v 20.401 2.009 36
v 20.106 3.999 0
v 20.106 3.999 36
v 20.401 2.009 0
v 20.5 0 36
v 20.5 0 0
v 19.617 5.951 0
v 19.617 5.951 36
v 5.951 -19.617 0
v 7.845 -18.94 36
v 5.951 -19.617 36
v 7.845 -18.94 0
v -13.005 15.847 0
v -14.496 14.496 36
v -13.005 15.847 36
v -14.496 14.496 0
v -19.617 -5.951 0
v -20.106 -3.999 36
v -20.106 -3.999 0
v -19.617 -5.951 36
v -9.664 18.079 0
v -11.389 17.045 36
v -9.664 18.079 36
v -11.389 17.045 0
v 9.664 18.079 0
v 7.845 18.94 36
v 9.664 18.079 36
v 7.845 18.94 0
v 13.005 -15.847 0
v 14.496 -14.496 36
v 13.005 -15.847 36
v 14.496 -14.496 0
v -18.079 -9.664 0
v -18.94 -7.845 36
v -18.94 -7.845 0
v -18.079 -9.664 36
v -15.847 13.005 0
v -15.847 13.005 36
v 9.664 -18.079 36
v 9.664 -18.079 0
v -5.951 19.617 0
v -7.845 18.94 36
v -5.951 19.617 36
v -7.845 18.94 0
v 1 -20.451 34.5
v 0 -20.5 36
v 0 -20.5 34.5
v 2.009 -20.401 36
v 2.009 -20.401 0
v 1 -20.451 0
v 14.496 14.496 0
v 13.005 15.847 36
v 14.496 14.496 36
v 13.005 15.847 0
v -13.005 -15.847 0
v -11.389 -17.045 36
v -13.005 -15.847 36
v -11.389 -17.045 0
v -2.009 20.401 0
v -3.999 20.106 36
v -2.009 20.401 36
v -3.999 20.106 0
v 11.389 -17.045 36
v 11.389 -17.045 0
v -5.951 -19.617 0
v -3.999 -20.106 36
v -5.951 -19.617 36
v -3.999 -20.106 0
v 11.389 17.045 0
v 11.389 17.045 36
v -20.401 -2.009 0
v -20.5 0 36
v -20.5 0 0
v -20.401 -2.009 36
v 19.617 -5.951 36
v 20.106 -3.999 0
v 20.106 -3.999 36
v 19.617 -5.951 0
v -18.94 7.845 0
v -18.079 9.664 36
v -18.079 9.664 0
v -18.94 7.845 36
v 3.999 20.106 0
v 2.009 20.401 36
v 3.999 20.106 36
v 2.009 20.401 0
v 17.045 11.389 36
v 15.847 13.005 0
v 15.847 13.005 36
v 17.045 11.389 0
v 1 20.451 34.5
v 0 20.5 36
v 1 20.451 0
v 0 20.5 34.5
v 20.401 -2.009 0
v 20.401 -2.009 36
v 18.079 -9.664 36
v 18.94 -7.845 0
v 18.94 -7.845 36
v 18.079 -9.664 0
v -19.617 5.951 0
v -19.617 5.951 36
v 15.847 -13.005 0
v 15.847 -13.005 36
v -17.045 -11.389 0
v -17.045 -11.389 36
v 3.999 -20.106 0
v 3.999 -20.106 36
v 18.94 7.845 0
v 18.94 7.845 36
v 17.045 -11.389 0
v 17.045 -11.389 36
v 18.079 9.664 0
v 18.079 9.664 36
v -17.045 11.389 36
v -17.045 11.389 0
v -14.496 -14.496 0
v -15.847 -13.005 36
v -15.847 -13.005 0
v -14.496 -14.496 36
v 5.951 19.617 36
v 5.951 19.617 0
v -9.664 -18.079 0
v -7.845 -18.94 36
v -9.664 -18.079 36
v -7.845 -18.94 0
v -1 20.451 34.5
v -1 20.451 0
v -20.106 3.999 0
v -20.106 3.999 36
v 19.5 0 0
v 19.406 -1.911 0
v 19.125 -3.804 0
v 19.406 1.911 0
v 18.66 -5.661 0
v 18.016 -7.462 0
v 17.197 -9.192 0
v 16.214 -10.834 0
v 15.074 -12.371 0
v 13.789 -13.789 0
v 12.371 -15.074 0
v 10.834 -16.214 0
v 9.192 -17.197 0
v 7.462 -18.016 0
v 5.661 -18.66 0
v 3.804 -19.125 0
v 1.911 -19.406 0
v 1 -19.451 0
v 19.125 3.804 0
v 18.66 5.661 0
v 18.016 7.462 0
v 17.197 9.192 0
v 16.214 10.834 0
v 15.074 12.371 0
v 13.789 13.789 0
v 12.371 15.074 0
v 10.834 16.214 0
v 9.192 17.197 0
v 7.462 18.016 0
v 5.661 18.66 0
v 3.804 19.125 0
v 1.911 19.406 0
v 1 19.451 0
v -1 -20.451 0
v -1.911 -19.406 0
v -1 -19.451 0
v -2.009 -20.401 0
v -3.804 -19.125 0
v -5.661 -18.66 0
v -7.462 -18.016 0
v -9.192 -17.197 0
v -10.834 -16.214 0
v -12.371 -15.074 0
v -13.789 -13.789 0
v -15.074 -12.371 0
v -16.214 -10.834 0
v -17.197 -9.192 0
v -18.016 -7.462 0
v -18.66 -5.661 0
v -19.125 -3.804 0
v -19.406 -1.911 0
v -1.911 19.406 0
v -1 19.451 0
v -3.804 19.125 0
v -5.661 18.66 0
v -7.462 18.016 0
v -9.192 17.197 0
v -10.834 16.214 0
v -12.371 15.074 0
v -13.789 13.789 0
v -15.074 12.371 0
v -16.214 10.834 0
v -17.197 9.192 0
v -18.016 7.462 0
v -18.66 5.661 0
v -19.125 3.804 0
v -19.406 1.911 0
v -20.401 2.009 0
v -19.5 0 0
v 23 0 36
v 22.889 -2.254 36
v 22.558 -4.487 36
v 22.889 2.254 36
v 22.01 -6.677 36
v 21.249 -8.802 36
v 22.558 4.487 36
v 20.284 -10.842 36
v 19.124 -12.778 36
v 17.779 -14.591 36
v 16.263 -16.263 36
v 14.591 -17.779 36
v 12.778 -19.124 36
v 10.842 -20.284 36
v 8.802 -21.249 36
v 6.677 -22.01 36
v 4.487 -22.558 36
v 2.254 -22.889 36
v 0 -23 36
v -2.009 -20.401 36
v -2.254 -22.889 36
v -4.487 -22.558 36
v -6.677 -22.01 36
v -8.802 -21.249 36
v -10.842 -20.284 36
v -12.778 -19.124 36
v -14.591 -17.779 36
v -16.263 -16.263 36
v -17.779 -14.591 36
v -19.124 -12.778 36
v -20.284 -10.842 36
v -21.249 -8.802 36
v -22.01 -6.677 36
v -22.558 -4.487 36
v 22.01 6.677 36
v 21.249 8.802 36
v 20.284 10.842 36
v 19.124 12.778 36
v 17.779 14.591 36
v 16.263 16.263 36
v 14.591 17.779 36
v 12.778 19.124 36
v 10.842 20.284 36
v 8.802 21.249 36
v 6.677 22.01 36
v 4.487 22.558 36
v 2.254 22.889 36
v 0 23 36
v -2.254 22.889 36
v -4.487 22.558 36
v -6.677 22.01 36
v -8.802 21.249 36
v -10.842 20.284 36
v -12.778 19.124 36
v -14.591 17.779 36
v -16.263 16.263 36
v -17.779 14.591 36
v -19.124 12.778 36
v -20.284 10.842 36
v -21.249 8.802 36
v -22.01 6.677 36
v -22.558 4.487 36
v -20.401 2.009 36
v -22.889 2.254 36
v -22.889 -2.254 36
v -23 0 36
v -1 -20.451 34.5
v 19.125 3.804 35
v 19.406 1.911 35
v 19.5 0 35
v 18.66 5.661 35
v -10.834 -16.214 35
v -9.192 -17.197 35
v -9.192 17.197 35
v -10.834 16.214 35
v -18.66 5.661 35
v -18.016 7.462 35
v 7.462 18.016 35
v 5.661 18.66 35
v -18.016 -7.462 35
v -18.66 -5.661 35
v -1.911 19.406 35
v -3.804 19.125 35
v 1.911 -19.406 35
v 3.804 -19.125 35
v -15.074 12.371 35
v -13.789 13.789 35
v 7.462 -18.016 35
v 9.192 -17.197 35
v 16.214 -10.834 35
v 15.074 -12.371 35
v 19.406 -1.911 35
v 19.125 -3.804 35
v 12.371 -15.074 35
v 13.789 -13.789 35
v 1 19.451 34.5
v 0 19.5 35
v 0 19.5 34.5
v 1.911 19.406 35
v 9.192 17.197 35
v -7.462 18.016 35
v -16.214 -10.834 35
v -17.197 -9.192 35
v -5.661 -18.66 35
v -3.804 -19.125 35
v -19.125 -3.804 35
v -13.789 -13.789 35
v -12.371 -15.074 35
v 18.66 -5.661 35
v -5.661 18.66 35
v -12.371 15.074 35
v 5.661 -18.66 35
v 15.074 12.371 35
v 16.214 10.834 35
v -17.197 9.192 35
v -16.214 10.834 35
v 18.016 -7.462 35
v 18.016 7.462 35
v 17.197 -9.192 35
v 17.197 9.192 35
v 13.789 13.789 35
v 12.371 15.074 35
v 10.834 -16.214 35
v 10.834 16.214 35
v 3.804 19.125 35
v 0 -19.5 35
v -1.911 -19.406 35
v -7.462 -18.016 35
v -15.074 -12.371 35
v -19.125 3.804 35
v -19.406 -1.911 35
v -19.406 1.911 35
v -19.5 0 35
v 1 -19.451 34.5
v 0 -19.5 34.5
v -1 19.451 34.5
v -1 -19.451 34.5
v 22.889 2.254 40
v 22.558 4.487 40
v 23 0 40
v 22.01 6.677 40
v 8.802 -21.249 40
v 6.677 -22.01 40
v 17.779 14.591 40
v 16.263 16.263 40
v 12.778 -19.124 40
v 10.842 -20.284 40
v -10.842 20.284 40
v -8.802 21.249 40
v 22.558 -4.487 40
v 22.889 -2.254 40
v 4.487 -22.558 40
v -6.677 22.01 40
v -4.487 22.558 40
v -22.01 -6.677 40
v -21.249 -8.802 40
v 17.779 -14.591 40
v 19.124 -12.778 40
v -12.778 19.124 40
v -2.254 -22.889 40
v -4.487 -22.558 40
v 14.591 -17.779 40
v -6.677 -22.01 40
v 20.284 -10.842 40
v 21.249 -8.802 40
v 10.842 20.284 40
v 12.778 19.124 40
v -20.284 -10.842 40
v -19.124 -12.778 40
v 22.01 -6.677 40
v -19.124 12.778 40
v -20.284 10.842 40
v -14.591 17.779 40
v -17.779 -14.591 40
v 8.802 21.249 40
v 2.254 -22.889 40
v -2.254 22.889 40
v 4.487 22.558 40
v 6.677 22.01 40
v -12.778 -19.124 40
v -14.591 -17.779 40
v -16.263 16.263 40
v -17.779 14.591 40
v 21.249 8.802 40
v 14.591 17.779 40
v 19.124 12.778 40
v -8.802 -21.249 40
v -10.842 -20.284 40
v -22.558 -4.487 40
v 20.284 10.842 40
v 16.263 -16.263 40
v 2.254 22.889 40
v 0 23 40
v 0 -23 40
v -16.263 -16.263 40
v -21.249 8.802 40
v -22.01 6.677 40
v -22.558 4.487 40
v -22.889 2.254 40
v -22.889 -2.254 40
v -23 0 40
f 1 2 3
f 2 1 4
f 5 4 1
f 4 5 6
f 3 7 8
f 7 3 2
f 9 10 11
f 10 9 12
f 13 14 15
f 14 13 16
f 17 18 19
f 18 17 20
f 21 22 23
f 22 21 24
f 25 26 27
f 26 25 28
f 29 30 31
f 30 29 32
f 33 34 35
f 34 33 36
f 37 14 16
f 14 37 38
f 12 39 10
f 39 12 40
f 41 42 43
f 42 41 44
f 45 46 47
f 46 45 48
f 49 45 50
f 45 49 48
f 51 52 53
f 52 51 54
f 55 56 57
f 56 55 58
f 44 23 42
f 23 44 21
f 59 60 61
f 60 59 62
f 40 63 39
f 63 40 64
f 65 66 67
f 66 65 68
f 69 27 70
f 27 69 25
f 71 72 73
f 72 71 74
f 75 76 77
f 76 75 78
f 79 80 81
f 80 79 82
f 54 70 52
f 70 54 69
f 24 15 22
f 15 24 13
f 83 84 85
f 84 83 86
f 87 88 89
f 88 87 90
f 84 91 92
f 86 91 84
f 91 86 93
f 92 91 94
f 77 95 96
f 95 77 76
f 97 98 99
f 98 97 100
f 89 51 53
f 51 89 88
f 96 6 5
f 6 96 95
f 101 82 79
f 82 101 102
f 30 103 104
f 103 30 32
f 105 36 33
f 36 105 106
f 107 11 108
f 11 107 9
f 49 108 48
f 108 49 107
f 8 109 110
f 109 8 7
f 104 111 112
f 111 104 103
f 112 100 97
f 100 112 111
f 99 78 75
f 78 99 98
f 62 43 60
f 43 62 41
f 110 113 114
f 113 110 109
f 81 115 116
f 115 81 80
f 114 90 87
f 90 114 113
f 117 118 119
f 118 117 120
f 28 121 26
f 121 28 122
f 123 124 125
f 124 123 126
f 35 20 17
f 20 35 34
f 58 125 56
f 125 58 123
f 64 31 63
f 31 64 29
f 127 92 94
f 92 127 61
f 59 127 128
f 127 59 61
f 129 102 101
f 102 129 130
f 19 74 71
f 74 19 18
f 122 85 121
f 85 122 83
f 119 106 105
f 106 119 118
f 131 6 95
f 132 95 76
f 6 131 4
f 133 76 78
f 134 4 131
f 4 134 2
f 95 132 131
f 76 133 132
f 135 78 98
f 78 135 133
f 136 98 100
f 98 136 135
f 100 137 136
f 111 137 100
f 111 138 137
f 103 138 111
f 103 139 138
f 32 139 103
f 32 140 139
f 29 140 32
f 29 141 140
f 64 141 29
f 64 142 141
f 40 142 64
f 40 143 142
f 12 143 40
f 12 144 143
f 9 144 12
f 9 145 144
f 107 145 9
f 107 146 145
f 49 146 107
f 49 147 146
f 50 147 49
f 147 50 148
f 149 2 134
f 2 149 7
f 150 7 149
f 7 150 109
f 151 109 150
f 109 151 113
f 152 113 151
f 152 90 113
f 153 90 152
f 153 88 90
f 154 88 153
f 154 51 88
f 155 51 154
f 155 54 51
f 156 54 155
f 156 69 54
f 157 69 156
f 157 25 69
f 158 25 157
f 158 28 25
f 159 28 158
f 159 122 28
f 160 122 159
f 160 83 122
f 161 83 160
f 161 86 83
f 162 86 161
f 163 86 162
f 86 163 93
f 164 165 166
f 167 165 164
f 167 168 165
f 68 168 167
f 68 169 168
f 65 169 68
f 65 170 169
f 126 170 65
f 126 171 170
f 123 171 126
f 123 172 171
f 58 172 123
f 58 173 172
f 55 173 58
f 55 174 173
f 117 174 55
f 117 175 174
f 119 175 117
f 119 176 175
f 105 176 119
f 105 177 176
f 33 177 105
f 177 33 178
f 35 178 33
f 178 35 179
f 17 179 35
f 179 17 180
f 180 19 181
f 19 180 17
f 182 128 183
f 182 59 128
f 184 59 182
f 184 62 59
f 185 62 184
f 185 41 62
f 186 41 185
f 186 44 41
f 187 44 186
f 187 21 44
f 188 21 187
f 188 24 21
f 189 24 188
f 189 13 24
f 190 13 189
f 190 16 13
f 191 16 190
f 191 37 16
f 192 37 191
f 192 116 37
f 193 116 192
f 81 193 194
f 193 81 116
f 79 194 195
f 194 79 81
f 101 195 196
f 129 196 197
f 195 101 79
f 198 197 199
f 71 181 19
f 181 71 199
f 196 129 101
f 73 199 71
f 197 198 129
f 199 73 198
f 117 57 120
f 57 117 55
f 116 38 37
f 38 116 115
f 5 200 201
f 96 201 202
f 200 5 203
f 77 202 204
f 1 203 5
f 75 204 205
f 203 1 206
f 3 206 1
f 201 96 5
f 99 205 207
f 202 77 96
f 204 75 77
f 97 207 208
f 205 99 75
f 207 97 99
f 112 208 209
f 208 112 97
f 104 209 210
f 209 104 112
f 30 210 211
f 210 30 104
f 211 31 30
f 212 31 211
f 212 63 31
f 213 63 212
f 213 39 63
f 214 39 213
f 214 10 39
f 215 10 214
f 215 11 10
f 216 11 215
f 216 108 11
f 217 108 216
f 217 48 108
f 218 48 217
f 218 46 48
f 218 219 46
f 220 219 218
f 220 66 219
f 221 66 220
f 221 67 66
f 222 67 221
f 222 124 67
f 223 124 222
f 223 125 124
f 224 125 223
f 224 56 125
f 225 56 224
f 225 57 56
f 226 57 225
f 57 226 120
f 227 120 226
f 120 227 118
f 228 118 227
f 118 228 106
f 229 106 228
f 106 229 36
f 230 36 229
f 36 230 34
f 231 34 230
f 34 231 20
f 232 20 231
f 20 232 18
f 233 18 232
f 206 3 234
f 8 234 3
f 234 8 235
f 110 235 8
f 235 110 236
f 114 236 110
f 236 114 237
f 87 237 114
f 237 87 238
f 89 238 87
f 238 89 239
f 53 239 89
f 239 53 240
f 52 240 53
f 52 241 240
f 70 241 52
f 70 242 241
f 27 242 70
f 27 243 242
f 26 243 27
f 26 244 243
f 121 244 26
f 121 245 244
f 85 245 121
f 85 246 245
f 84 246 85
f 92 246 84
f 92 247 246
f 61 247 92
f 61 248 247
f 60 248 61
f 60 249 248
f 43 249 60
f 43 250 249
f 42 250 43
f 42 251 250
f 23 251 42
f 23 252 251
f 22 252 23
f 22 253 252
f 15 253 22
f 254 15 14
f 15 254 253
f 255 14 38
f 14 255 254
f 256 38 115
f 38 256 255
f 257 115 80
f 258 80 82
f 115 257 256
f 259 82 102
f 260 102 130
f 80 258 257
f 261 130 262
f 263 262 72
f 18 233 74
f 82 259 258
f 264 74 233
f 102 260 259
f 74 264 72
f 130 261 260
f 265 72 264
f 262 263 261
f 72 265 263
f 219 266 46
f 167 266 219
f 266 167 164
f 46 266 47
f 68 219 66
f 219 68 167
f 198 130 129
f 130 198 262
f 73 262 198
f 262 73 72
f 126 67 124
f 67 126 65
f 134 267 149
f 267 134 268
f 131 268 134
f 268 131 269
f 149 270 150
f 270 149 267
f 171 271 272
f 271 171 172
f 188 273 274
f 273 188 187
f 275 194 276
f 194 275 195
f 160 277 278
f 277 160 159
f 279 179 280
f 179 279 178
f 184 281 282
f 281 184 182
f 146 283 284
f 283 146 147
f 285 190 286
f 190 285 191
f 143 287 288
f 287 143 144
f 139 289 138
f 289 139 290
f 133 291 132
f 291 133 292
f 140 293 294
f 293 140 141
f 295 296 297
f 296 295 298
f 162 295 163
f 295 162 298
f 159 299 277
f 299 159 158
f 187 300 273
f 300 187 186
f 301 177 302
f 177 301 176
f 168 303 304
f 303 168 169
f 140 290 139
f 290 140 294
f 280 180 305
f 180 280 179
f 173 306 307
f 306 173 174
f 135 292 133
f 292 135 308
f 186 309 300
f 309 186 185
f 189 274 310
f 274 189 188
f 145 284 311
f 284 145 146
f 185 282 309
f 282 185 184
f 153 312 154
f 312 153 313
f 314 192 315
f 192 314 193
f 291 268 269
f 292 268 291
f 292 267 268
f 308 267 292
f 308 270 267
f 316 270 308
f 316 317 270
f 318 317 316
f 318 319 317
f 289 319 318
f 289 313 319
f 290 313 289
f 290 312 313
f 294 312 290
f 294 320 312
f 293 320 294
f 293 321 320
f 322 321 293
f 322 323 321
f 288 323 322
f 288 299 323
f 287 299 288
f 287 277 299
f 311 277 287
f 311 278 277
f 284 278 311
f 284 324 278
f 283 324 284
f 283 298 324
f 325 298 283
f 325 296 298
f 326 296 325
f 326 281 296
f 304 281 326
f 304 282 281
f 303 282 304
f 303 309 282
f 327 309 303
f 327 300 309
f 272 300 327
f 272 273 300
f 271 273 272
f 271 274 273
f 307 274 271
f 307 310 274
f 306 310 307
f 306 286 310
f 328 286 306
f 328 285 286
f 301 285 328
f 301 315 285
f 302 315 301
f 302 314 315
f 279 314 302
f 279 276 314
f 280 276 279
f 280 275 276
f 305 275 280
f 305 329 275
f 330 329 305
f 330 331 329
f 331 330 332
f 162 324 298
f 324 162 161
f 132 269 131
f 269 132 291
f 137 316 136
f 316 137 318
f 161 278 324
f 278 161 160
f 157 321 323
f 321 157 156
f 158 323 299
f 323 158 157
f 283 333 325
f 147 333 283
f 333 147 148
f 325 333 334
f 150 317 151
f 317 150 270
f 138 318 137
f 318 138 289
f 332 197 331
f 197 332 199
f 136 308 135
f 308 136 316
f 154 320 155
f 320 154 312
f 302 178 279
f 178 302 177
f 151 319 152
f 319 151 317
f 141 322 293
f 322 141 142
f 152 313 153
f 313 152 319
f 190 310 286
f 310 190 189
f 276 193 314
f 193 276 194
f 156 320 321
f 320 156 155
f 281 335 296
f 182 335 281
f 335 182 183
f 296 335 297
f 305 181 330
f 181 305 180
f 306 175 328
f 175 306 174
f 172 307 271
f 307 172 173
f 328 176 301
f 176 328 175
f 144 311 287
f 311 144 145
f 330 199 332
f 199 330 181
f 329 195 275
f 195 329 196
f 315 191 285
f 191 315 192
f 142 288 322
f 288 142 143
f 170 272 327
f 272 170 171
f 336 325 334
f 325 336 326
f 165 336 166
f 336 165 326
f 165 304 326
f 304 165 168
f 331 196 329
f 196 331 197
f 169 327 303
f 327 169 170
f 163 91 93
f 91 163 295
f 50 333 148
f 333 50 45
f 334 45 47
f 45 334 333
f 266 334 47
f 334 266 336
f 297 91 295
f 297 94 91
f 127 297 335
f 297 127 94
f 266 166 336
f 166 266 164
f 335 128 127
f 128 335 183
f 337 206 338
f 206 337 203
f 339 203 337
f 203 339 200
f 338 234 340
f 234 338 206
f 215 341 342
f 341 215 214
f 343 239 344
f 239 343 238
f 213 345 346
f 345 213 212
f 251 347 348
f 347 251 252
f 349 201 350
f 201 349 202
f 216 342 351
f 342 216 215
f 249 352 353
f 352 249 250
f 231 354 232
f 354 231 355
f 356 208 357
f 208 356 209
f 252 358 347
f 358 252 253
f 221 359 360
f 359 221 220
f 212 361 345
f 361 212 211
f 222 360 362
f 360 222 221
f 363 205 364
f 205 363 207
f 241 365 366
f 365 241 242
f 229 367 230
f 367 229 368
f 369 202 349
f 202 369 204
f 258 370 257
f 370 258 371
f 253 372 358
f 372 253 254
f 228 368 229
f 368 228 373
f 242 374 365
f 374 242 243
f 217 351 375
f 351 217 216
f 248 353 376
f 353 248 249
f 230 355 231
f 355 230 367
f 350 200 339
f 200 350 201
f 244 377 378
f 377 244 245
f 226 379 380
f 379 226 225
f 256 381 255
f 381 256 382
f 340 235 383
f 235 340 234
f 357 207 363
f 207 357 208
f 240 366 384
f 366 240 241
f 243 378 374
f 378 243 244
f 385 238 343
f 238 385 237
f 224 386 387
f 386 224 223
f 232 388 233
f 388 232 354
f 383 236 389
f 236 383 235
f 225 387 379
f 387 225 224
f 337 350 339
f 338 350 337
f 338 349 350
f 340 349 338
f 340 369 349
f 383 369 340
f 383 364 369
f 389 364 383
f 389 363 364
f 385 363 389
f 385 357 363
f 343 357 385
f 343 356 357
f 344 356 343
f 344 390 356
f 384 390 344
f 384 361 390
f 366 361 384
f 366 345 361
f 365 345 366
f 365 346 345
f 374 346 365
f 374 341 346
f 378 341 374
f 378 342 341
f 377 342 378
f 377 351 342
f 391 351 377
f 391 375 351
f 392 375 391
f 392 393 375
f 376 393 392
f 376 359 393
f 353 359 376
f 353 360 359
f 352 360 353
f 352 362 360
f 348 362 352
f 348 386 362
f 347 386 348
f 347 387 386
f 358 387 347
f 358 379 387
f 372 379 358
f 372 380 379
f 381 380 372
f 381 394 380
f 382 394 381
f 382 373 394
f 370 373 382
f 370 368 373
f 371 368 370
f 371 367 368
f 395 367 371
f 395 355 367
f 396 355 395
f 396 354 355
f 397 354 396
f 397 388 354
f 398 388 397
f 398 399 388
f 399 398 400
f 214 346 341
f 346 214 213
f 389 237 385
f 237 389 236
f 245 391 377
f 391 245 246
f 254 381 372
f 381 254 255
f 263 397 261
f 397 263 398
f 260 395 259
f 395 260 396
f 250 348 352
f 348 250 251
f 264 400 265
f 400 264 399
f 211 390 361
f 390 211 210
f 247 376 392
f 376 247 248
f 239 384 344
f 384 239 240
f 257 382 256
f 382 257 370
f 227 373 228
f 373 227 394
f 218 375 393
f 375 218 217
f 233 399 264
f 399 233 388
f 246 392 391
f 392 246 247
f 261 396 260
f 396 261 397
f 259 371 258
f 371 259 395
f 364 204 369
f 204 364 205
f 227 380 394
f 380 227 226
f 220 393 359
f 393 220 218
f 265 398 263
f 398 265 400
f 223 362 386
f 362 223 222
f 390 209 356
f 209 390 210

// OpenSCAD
$fn=64;

difference() {
  cylinder(d=41, h=36);
  translate([0,0,-1]) cylinder(d=39,h=36);
  translate([0,0,34/2]) cube([2, 50, 35], center=true);
}

translate([0,0,36]) cylinder(d=46, h=4);
